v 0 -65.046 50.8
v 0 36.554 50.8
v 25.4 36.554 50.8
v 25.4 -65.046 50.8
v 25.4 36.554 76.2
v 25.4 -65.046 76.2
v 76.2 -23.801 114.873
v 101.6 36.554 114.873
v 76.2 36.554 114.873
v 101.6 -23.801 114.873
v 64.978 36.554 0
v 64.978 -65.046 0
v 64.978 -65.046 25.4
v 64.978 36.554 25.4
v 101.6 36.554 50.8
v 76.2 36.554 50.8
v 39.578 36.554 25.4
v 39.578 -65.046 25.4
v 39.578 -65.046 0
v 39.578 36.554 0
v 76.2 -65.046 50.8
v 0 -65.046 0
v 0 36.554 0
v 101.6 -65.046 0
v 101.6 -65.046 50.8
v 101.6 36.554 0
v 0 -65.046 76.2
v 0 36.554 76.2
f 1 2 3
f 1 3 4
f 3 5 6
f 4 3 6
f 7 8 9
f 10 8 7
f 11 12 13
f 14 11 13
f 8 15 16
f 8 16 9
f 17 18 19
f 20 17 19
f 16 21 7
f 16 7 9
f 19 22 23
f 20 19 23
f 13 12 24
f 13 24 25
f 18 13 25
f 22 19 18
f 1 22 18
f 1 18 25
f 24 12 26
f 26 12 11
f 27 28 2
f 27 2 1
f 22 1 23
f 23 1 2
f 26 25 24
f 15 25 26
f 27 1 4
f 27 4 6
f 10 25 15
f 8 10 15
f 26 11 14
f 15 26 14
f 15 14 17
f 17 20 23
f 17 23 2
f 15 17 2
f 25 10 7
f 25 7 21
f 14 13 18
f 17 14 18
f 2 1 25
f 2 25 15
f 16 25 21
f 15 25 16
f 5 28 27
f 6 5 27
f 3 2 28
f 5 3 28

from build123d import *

# Parameters (mm, degrees)
F0_W     = 101.6
F0_H     = 50.8
F1_DEPTH = 101.6
F2_W     = 101.6
F2_H     = 25.4
F3_DEPTH = 25.4
F5_DEPTH = 25.4
F7_DEPTH = 101.6


with BuildPart() as f1:
    # F0 (on Right) → F1 (new body)
    with BuildSketch(Plane.YZ):
        with Locations((-14.246303, 25.4)):
            Rectangle(F0_W, F0_H)
    extrude(amount=F1_DEPTH)

    # F6 (on face) → F7 (cut)
    with BuildSketch(Plane.XZ.offset(65.046303)):
        Polygon((39.578289, 0), (50.8, 0), (64.978289, 0), (64.978289, 25.4), (39.578289, 25.4), align=None)
    extrude(amount=-F7_DEPTH, mode=Mode.SUBTRACT)


with BuildPart() as f3:
    # F2 (on face) → F3 (new body)
    with BuildSketch(Plane(origin=(0, 0, 0), x_dir=(0, -1, 0), z_dir=(-1, 0, 0))):
        with Locations((14.246303, 63.5)):
            Rectangle(F2_W, F2_H)
    extrude(amount=-F3_DEPTH)


with BuildPart() as f5:
    # F4 (on face) → F5 (new body)
    with BuildSketch(Plane.YZ.offset(101.6)):
        Polygon((-23.80142, 114.872612), (-65.046303, 50.8), (36.553697, 50.8), (36.553697, 114.872612), align=None)
    extrude(amount=-F5_DEPTH)


solid = Compound([f1.part, f3.part, f5.part])
